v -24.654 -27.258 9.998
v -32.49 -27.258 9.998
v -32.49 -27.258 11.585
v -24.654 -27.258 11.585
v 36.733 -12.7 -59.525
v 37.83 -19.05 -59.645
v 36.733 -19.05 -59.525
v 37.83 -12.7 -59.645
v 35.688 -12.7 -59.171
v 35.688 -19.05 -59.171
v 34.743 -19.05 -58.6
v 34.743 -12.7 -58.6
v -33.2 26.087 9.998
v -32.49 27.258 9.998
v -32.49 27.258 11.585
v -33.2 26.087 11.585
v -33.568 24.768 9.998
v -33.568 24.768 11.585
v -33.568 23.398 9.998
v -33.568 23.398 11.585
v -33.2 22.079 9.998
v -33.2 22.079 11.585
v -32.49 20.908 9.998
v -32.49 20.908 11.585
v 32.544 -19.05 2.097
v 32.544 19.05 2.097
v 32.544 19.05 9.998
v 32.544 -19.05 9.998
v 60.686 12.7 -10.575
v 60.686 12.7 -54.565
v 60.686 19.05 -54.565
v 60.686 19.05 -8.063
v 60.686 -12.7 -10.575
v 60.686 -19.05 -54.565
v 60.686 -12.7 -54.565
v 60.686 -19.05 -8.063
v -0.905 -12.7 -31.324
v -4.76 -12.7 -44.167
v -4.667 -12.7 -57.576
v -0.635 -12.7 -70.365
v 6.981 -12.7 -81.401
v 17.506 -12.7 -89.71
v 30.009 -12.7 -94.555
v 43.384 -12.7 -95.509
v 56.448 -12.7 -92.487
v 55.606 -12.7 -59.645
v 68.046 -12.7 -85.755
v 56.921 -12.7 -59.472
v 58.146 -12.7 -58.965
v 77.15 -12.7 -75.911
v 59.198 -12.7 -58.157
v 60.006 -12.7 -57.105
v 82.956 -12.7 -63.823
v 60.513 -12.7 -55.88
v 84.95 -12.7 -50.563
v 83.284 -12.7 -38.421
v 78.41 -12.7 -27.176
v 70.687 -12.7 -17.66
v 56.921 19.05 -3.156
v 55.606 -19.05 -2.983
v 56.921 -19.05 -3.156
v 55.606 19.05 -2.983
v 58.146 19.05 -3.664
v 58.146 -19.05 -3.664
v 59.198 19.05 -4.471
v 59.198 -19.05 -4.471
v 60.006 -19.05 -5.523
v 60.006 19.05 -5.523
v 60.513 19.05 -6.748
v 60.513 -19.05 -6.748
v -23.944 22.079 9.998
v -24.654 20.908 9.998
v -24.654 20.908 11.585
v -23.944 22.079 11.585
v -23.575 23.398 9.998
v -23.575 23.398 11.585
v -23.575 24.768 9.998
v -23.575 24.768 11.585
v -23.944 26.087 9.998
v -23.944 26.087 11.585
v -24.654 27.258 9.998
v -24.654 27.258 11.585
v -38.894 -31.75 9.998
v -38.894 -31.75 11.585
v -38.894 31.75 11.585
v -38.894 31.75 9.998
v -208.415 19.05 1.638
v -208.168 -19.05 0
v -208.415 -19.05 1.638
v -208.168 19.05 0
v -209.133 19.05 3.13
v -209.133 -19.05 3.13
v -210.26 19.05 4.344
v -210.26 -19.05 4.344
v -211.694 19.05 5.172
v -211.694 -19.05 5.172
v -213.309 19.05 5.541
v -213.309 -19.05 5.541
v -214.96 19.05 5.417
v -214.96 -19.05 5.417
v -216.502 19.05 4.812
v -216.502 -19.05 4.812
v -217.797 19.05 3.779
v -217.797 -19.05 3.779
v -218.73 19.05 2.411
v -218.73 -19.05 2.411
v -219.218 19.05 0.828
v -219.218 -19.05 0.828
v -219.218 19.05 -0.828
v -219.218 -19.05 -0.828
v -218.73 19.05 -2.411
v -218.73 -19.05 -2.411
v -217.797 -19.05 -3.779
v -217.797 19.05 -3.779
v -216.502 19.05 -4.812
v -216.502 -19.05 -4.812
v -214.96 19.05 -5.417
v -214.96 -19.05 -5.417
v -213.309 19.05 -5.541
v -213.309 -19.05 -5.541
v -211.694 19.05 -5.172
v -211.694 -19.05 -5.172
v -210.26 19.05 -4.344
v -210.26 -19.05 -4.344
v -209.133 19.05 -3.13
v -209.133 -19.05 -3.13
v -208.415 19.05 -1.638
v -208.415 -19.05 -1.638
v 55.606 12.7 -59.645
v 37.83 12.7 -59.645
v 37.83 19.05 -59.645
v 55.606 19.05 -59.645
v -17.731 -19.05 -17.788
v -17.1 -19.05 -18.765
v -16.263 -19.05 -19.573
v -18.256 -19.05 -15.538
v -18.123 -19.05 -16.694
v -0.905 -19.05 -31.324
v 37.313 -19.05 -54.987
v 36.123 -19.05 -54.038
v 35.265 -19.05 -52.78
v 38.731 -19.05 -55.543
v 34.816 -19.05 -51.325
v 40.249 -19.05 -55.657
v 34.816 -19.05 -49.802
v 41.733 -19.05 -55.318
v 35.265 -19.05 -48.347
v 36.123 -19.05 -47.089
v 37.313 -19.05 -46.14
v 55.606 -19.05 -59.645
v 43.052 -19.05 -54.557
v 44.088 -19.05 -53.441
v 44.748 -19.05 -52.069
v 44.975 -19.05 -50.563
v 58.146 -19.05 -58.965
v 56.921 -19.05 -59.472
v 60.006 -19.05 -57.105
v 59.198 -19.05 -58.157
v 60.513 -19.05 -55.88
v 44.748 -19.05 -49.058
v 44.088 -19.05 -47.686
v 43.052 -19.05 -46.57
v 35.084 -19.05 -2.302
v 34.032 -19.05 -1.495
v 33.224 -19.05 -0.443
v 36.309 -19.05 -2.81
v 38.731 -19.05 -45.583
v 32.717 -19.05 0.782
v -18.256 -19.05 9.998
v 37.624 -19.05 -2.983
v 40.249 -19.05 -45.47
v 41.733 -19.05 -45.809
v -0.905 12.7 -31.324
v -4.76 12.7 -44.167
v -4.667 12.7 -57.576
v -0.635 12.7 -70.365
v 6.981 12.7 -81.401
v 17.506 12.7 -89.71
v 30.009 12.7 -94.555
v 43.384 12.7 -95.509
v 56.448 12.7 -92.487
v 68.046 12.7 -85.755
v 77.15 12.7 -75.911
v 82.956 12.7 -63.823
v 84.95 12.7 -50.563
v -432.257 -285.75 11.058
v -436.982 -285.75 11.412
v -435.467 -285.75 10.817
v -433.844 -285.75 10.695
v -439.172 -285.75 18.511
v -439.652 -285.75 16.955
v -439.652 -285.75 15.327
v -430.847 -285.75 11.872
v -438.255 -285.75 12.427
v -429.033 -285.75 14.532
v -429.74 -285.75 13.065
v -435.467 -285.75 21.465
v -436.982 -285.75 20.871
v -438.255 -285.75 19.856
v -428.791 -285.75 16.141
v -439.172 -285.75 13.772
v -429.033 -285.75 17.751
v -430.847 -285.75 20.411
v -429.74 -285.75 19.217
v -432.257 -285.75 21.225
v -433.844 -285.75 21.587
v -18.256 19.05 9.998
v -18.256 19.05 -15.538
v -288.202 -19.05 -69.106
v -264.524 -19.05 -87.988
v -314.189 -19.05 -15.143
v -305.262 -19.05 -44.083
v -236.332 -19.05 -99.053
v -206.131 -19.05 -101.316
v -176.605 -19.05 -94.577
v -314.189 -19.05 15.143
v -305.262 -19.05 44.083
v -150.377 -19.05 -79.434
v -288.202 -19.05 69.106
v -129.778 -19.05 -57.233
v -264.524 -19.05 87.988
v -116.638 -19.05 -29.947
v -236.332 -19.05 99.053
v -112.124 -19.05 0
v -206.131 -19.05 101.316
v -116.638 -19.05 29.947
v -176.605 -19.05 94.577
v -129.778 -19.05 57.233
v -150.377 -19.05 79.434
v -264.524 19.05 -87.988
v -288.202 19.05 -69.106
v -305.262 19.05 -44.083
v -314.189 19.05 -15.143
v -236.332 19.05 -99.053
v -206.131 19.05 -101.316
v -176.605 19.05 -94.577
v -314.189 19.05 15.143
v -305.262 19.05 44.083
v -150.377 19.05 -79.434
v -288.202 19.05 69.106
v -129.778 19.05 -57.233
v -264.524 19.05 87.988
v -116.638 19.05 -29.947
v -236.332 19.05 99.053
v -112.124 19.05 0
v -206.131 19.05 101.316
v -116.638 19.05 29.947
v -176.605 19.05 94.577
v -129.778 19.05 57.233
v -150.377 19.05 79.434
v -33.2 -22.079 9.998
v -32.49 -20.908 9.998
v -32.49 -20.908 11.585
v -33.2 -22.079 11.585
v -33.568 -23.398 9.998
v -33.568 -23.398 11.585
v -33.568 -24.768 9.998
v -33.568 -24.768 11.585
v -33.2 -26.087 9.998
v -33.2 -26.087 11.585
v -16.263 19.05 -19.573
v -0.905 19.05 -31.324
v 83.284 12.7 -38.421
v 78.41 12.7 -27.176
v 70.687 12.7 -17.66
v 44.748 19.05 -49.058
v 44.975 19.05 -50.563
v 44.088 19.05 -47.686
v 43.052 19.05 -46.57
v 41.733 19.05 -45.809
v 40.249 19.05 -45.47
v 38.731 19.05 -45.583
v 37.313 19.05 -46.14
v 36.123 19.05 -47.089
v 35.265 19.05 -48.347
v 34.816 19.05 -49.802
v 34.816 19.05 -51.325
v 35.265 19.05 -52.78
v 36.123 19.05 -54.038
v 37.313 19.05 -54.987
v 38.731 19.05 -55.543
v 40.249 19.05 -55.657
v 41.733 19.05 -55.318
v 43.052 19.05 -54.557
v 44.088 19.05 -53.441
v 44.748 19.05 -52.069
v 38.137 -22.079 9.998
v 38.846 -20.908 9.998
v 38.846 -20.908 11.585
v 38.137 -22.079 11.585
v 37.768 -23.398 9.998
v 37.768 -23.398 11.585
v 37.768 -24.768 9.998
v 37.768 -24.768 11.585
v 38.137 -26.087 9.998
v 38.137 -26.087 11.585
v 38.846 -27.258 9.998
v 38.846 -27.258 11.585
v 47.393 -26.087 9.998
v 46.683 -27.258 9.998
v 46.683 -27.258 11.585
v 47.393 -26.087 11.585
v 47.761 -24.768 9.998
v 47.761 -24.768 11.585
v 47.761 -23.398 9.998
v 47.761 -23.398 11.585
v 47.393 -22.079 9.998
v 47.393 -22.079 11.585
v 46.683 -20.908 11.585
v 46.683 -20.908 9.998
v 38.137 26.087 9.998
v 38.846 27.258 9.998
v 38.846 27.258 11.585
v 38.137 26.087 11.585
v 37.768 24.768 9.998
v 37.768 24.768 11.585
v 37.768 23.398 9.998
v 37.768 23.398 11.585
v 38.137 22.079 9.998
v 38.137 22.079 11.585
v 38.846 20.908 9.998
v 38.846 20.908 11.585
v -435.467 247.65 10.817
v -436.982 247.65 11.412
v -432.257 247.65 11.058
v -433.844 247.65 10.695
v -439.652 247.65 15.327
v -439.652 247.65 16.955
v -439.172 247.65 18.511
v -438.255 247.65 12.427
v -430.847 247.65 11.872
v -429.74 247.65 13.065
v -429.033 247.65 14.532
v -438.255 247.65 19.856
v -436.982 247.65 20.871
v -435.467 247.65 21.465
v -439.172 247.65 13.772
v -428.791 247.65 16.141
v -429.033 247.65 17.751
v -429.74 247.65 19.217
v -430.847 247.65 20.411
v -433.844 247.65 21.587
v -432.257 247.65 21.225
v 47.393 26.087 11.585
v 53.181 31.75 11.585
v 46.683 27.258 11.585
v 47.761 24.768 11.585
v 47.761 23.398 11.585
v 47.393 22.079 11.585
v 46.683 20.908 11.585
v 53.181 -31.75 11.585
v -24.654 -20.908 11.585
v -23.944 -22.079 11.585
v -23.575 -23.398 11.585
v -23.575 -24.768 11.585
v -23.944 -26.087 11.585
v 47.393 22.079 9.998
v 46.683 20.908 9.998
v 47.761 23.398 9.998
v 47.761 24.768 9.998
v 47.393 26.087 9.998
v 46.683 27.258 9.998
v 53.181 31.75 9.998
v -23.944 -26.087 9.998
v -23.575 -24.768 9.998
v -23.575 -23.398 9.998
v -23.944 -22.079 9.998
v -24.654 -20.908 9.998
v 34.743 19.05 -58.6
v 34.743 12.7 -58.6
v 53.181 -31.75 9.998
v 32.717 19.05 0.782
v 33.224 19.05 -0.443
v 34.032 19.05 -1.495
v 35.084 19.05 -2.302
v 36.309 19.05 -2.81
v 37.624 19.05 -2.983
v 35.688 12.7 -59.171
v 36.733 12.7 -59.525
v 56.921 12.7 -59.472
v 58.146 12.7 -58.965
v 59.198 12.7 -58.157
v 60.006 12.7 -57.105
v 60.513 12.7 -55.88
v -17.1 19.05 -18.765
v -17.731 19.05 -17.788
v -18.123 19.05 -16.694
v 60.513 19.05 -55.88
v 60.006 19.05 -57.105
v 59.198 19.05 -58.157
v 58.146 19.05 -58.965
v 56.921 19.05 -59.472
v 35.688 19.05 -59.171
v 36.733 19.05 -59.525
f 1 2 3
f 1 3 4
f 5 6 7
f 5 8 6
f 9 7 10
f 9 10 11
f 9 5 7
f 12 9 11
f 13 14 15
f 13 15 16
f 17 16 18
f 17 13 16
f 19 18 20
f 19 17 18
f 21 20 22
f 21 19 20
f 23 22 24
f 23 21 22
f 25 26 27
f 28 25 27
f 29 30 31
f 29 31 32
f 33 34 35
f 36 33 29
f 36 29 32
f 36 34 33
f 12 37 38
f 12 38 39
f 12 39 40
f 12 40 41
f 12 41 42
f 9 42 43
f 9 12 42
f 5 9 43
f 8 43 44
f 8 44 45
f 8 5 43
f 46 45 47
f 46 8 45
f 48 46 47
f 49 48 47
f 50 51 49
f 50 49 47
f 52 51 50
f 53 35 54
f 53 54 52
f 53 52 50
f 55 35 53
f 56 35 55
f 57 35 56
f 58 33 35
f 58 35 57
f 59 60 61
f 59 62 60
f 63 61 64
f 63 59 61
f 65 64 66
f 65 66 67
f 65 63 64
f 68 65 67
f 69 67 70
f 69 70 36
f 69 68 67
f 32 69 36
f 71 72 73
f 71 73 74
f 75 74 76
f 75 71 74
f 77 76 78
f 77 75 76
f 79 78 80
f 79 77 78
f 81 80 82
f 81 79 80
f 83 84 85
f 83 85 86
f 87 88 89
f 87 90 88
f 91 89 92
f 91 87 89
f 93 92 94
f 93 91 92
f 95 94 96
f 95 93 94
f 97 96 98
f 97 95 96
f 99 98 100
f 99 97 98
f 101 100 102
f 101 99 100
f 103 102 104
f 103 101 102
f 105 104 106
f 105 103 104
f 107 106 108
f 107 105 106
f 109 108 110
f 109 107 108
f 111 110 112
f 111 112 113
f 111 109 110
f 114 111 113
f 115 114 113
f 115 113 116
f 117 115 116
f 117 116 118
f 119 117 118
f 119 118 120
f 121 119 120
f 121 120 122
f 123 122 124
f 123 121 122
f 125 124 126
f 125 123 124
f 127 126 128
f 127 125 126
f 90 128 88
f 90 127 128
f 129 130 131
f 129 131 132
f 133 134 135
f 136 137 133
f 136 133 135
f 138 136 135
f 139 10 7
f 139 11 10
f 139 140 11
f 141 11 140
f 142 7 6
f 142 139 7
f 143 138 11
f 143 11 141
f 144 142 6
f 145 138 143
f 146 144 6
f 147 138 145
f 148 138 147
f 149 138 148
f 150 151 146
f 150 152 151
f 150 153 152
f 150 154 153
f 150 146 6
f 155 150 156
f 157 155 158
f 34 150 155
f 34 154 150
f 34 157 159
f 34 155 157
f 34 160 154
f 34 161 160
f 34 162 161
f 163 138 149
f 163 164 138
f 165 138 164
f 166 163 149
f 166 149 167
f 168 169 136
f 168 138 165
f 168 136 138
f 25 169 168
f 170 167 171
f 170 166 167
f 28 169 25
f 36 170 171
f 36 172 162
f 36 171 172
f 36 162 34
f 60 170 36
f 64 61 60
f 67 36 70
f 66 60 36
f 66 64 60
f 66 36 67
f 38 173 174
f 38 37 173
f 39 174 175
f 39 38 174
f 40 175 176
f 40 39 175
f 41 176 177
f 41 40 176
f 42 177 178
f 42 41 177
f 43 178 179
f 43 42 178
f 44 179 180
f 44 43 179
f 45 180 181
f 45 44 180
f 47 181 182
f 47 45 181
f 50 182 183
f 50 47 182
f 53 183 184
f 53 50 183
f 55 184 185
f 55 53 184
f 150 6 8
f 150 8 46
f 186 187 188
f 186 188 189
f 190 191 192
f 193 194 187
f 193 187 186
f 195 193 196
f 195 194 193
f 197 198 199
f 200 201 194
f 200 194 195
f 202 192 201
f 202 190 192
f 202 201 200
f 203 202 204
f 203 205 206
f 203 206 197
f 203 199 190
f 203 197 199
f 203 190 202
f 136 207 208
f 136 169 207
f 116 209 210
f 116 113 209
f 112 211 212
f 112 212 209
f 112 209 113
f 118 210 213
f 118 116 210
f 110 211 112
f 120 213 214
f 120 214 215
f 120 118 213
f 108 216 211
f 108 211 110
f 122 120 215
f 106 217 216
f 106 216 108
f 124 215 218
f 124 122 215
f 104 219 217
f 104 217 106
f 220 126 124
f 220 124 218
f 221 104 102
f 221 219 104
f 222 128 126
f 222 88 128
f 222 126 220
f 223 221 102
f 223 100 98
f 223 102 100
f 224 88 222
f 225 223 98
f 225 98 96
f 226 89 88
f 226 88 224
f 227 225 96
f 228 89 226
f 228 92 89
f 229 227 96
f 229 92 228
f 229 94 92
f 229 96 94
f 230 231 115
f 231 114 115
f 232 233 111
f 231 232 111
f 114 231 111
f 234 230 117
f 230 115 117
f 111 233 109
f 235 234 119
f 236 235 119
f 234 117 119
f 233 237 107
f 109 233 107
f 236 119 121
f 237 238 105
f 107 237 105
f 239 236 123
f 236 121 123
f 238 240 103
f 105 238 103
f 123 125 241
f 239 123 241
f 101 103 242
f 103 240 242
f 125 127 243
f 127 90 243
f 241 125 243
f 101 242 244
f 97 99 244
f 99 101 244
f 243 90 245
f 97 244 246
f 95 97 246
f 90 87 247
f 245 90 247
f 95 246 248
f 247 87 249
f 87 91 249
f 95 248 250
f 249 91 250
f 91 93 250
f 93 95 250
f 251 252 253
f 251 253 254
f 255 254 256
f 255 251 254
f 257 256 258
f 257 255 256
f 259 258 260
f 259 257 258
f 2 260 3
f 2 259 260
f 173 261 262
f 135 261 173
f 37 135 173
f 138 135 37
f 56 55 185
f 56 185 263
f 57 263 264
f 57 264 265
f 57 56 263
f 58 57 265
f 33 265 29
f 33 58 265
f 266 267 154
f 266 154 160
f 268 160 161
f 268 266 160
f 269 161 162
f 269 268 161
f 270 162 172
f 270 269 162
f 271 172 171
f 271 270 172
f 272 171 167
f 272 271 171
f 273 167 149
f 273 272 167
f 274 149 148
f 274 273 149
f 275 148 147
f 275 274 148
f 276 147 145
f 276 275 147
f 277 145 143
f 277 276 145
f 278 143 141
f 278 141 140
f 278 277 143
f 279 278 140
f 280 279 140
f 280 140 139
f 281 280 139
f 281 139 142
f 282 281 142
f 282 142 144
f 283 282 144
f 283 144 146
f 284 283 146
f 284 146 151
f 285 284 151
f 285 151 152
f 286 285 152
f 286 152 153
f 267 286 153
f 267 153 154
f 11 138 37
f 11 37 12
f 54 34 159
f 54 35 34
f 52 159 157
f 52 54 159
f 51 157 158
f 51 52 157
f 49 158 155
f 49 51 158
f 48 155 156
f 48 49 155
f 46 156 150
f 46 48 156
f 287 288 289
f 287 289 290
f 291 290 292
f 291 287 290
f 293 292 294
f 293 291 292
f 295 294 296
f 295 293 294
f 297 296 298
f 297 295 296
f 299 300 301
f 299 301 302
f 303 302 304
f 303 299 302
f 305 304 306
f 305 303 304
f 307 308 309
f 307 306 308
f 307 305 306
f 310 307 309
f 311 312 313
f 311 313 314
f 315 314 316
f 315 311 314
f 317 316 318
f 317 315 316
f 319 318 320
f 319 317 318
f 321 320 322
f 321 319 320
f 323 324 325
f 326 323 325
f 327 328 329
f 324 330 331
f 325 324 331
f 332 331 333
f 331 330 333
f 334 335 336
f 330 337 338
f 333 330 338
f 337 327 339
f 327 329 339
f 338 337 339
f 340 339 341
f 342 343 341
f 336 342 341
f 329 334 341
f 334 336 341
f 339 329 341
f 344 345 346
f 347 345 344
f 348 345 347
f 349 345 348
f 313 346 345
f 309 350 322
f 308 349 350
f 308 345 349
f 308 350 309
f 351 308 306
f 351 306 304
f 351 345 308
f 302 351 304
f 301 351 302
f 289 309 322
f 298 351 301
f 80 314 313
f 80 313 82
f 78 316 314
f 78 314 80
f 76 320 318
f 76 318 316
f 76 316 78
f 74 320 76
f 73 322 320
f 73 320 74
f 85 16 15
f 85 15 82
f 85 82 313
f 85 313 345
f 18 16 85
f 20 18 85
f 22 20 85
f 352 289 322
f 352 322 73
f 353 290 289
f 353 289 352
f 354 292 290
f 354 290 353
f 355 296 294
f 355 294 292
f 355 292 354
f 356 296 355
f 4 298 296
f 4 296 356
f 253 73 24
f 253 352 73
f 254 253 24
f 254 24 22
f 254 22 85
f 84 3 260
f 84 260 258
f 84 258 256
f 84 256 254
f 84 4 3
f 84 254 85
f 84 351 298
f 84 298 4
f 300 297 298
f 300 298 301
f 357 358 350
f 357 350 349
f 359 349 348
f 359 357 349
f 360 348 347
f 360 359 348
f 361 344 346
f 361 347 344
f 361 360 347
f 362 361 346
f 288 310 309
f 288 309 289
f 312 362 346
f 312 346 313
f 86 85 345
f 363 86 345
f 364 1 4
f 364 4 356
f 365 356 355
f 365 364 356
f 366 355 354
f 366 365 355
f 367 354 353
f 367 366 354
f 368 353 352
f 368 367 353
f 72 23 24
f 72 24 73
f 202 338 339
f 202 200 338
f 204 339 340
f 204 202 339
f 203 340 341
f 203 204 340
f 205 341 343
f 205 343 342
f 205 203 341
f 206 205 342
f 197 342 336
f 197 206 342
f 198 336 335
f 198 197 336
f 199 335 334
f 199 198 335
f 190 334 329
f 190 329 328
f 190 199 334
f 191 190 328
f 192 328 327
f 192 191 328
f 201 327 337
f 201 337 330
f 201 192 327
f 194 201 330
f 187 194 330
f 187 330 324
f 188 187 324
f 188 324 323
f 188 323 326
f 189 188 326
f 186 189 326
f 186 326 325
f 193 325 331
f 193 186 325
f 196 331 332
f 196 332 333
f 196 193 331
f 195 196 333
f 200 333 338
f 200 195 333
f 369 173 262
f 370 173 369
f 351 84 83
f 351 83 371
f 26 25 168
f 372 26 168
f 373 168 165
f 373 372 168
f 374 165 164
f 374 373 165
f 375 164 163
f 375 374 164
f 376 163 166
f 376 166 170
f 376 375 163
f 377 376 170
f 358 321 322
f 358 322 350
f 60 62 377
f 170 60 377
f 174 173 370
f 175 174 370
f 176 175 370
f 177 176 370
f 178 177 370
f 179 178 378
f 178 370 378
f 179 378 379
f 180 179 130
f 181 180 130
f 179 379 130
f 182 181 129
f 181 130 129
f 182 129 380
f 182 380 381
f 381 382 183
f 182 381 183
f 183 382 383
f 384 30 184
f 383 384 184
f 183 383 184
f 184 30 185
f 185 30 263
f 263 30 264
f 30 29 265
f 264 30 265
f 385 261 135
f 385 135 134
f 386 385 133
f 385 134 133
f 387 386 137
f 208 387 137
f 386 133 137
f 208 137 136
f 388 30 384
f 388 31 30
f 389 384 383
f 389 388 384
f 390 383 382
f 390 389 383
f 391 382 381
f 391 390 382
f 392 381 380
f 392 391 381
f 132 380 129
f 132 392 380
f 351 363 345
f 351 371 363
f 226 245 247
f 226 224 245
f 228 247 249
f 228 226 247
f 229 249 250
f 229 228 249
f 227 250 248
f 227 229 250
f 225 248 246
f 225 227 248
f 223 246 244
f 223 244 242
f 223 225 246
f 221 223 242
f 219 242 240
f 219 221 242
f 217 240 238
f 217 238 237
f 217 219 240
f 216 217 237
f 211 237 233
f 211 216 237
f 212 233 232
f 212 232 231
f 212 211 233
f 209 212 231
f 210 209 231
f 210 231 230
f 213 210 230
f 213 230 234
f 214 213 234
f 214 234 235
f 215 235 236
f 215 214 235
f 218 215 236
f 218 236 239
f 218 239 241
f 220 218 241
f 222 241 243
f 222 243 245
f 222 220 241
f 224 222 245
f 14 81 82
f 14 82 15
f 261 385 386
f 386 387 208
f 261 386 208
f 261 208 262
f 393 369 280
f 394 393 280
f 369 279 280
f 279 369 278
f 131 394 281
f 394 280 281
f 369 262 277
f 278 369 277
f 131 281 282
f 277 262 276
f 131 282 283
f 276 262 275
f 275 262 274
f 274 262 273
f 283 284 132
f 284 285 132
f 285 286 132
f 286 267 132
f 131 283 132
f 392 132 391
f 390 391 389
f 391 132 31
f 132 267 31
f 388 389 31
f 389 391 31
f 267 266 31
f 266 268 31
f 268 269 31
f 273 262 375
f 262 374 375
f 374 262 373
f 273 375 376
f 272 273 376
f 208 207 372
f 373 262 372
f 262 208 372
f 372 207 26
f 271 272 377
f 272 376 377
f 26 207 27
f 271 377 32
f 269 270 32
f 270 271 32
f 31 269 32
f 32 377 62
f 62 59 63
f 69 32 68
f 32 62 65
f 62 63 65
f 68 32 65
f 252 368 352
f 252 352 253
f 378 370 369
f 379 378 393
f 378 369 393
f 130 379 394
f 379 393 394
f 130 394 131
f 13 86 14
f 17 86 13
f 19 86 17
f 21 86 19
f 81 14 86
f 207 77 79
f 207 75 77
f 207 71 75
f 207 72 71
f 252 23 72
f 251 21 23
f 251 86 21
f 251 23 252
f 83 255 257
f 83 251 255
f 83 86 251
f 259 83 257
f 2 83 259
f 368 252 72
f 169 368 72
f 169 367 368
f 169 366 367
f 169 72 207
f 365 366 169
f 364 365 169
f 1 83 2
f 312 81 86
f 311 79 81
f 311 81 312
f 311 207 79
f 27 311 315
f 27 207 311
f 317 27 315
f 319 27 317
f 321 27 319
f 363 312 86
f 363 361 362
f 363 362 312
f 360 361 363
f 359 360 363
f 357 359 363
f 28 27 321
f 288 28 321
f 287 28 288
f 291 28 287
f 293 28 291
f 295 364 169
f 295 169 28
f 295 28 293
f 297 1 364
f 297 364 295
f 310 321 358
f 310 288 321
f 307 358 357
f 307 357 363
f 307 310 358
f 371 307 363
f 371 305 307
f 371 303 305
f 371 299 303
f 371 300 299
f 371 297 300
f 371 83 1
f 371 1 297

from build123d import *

# Parameters (mm, degrees)
F1_DEPTH  = 31.75
F0_R      = 5.107985
F2_DEPTH  = 12.7
F3_DEPTH  = 19.05
F4_R      = 5.08
F6_DEPTH  = 11.586112
F7_R      = 101.6
F7_R_2    = 5.55625
F8_DEPTH  = 19.05
F9_R      = 5.461
F10_DEPTH = 266.7


with BuildPart() as f1:
    # F0 (on Front) → F1 (new body, symmetric)
    with BuildSketch(Plane.XZ):
        Polygon((32.54375, 9.997612), (53.18125, 9.997612), (53.18125, 11.585112), (-38.89375, 11.585112), (-38.89375, 9.997612), (-18.25625, 9.997612), align=None)
    extrude(amount=F1_DEPTH, both=True)



with BuildPart() as f2:
    # F0 (on Front) → F2 (new body, symmetric)
    with BuildSketch(Plane.XZ):
        with BuildLine():
            Line((36.109813, -59.645225), (-0.904608, -31.324242))
            ThreePointArc((-0.904608, -31.324242), (30.009032, -94.555453), (84.95026, -50.563399))
            ThreePointArc((84.95026, -50.563399), (78.409808, -27.17644), (60.686174, -10.575232))
            Line((60.686174, -10.575232), (60.686174, -59.645225))
            Line((60.686174, -59.645225), (36.109813, -59.645225))
        make_face()
        with BuildLine():
            ThreePointArc((60.686174, -10.575232), (25.474166, -7.839575), (-0.904608, -31.324242))
            Line((-0.904608, -31.324242), (36.109813, -59.645225))
            Line((36.109813, -59.645225), (60.686174, -59.645225))
            Line((60.686174, -59.645225), (60.686174, -10.575232))
        make_face()
        with Locations((39.867181, -50.563399)):
            Circle(F0_R, mode=Mode.SUBTRACT)
    extrude(amount=F2_DEPTH, both=True)


with BuildPart() as f1_1:
    add(f1.part)

    add(f2.part)  # F3 merges F2
    # F0 (on Front) → F3 (join, symmetric)
    with BuildSketch(Plane.XZ):
        with BuildLine():
            Line((32.54375, -2.98306), (32.54375, 9.997612))
            Line((32.54375, 9.997612), (-18.25625, 9.997612))
            Line((-18.25625, 9.997612), (-18.25625, -18.047915))
            Line((-18.25625, -18.047915), (-0.904608, -31.324242))
            ThreePointArc((-0.904608, -31.324242), (25.474166, -7.839575), (60.686174, -10.575232))
            Line((60.686174, -10.575232), (60.686174, -2.98306))
            Line((60.686174, -2.98306), (32.54375, -2.98306))
        make_face()
        with BuildLine():
            ThreePointArc((60.686174, -10.575232), (25.474166, -7.839575), (-0.904608, -31.324242))
            Line((-0.904608, -31.324242), (36.109813, -59.645225))
            Line((36.109813, -59.645225), (60.686174, -59.645225))
            Line((60.686174, -59.645225), (60.686174, -10.575232))
        make_face()
        with Locations((39.867181, -50.563399)):
            Circle(F0_R, mode=Mode.SUBTRACT)
    extrude(amount=F3_DEPTH, both=True)

    # F4
    f4_edges = [f1_1.edges().sort_by_distance(p)[0] for p in [
        (60.686174, 0, -2.98306),
        (60.686174, -15.875, -59.645225),
        (60.686174, 15.875, -59.645225),
        (36.109813, -15.875, -59.645225),
        (36.109813, 15.875, -59.645225),
        (-18.25625, 0, -18.047915),
        (32.54375, 0, -2.98306),
    ]]
    fillet(f4_edges, radius=F4_R)

    # F5 (on Top) → F6 (cut, through all)
    with BuildSketch(Plane.XY):
        with BuildLine():
            Line((-32.490059, 20.908033), (-24.653533, 20.908033))
            ThreePointArc((-24.653533, 20.908033), (-23.528641, 24.083033), (-24.653533, 27.258033))
            Line((-24.653533, 27.258033), (-32.490059, 27.258033))
            ThreePointArc((-32.490059, 27.258033), (-33.614951, 24.083033), (-32.490059, 20.908033))
        make_face()
        with BuildLine():
            Line((38.846467, 20.908033), (46.682993, 20.908033))
            ThreePointArc((46.682993, 20.908033), (47.807884, 24.083033), (46.682993, 27.258033))
            Line((46.682993, 27.258033), (38.846467, 27.258033))
            ThreePointArc((38.846467, 27.258033), (37.721575, 24.083033), (38.846467, 20.908033))
        make_face()
        with BuildLine():
            Line((-24.653533, -20.908033), (-32.490059, -20.908033))
            ThreePointArc((-32.490059, -20.908033), (-33.614951, -24.083033), (-32.490059, -27.258033))
            Line((-32.490059, -27.258033), (-24.653533, -27.258033))
            ThreePointArc((-24.653533, -27.258033), (-23.528641, -24.083033), (-24.653533, -20.908033))
        make_face()
        with BuildLine():
            Line((46.682993, -20.908033), (38.846467, -20.908033))
            ThreePointArc((38.846467, -20.908033), (37.721575, -24.083033), (38.846467, -27.258033))
            Line((38.846467, -27.258033), (46.682993, -27.258033))
            ThreePointArc((46.682993, -27.258033), (47.807884, -24.083033), (46.682993, -20.908033))
        make_face()
    extrude(amount=F6_DEPTH, mode=Mode.SUBTRACT)


with BuildPart() as f8:
    # F7 (on Front) → F8 (new body, symmetric)
    with BuildSketch(Plane.XZ):
        with Locations((-213.723938, 0)):
            Circle(F7_R)
        with Locations((-213.723938, 0)):
            Circle(F7_R_2, mode=Mode.SUBTRACT)
    extrude(amount=F8_DEPTH, both=True)


with BuildPart() as f10:
    # F9 (on face) → F10 (new body, symmetric)
    with BuildSketch(Plane.XZ.offset(19.05)):
        with Locations((-434.251696, 16.141204)):
            Circle(F9_R)
    extrude(amount=F10_DEPTH, both=True)


solid = Compound([f1_1.part, f8.part, f10.part])
